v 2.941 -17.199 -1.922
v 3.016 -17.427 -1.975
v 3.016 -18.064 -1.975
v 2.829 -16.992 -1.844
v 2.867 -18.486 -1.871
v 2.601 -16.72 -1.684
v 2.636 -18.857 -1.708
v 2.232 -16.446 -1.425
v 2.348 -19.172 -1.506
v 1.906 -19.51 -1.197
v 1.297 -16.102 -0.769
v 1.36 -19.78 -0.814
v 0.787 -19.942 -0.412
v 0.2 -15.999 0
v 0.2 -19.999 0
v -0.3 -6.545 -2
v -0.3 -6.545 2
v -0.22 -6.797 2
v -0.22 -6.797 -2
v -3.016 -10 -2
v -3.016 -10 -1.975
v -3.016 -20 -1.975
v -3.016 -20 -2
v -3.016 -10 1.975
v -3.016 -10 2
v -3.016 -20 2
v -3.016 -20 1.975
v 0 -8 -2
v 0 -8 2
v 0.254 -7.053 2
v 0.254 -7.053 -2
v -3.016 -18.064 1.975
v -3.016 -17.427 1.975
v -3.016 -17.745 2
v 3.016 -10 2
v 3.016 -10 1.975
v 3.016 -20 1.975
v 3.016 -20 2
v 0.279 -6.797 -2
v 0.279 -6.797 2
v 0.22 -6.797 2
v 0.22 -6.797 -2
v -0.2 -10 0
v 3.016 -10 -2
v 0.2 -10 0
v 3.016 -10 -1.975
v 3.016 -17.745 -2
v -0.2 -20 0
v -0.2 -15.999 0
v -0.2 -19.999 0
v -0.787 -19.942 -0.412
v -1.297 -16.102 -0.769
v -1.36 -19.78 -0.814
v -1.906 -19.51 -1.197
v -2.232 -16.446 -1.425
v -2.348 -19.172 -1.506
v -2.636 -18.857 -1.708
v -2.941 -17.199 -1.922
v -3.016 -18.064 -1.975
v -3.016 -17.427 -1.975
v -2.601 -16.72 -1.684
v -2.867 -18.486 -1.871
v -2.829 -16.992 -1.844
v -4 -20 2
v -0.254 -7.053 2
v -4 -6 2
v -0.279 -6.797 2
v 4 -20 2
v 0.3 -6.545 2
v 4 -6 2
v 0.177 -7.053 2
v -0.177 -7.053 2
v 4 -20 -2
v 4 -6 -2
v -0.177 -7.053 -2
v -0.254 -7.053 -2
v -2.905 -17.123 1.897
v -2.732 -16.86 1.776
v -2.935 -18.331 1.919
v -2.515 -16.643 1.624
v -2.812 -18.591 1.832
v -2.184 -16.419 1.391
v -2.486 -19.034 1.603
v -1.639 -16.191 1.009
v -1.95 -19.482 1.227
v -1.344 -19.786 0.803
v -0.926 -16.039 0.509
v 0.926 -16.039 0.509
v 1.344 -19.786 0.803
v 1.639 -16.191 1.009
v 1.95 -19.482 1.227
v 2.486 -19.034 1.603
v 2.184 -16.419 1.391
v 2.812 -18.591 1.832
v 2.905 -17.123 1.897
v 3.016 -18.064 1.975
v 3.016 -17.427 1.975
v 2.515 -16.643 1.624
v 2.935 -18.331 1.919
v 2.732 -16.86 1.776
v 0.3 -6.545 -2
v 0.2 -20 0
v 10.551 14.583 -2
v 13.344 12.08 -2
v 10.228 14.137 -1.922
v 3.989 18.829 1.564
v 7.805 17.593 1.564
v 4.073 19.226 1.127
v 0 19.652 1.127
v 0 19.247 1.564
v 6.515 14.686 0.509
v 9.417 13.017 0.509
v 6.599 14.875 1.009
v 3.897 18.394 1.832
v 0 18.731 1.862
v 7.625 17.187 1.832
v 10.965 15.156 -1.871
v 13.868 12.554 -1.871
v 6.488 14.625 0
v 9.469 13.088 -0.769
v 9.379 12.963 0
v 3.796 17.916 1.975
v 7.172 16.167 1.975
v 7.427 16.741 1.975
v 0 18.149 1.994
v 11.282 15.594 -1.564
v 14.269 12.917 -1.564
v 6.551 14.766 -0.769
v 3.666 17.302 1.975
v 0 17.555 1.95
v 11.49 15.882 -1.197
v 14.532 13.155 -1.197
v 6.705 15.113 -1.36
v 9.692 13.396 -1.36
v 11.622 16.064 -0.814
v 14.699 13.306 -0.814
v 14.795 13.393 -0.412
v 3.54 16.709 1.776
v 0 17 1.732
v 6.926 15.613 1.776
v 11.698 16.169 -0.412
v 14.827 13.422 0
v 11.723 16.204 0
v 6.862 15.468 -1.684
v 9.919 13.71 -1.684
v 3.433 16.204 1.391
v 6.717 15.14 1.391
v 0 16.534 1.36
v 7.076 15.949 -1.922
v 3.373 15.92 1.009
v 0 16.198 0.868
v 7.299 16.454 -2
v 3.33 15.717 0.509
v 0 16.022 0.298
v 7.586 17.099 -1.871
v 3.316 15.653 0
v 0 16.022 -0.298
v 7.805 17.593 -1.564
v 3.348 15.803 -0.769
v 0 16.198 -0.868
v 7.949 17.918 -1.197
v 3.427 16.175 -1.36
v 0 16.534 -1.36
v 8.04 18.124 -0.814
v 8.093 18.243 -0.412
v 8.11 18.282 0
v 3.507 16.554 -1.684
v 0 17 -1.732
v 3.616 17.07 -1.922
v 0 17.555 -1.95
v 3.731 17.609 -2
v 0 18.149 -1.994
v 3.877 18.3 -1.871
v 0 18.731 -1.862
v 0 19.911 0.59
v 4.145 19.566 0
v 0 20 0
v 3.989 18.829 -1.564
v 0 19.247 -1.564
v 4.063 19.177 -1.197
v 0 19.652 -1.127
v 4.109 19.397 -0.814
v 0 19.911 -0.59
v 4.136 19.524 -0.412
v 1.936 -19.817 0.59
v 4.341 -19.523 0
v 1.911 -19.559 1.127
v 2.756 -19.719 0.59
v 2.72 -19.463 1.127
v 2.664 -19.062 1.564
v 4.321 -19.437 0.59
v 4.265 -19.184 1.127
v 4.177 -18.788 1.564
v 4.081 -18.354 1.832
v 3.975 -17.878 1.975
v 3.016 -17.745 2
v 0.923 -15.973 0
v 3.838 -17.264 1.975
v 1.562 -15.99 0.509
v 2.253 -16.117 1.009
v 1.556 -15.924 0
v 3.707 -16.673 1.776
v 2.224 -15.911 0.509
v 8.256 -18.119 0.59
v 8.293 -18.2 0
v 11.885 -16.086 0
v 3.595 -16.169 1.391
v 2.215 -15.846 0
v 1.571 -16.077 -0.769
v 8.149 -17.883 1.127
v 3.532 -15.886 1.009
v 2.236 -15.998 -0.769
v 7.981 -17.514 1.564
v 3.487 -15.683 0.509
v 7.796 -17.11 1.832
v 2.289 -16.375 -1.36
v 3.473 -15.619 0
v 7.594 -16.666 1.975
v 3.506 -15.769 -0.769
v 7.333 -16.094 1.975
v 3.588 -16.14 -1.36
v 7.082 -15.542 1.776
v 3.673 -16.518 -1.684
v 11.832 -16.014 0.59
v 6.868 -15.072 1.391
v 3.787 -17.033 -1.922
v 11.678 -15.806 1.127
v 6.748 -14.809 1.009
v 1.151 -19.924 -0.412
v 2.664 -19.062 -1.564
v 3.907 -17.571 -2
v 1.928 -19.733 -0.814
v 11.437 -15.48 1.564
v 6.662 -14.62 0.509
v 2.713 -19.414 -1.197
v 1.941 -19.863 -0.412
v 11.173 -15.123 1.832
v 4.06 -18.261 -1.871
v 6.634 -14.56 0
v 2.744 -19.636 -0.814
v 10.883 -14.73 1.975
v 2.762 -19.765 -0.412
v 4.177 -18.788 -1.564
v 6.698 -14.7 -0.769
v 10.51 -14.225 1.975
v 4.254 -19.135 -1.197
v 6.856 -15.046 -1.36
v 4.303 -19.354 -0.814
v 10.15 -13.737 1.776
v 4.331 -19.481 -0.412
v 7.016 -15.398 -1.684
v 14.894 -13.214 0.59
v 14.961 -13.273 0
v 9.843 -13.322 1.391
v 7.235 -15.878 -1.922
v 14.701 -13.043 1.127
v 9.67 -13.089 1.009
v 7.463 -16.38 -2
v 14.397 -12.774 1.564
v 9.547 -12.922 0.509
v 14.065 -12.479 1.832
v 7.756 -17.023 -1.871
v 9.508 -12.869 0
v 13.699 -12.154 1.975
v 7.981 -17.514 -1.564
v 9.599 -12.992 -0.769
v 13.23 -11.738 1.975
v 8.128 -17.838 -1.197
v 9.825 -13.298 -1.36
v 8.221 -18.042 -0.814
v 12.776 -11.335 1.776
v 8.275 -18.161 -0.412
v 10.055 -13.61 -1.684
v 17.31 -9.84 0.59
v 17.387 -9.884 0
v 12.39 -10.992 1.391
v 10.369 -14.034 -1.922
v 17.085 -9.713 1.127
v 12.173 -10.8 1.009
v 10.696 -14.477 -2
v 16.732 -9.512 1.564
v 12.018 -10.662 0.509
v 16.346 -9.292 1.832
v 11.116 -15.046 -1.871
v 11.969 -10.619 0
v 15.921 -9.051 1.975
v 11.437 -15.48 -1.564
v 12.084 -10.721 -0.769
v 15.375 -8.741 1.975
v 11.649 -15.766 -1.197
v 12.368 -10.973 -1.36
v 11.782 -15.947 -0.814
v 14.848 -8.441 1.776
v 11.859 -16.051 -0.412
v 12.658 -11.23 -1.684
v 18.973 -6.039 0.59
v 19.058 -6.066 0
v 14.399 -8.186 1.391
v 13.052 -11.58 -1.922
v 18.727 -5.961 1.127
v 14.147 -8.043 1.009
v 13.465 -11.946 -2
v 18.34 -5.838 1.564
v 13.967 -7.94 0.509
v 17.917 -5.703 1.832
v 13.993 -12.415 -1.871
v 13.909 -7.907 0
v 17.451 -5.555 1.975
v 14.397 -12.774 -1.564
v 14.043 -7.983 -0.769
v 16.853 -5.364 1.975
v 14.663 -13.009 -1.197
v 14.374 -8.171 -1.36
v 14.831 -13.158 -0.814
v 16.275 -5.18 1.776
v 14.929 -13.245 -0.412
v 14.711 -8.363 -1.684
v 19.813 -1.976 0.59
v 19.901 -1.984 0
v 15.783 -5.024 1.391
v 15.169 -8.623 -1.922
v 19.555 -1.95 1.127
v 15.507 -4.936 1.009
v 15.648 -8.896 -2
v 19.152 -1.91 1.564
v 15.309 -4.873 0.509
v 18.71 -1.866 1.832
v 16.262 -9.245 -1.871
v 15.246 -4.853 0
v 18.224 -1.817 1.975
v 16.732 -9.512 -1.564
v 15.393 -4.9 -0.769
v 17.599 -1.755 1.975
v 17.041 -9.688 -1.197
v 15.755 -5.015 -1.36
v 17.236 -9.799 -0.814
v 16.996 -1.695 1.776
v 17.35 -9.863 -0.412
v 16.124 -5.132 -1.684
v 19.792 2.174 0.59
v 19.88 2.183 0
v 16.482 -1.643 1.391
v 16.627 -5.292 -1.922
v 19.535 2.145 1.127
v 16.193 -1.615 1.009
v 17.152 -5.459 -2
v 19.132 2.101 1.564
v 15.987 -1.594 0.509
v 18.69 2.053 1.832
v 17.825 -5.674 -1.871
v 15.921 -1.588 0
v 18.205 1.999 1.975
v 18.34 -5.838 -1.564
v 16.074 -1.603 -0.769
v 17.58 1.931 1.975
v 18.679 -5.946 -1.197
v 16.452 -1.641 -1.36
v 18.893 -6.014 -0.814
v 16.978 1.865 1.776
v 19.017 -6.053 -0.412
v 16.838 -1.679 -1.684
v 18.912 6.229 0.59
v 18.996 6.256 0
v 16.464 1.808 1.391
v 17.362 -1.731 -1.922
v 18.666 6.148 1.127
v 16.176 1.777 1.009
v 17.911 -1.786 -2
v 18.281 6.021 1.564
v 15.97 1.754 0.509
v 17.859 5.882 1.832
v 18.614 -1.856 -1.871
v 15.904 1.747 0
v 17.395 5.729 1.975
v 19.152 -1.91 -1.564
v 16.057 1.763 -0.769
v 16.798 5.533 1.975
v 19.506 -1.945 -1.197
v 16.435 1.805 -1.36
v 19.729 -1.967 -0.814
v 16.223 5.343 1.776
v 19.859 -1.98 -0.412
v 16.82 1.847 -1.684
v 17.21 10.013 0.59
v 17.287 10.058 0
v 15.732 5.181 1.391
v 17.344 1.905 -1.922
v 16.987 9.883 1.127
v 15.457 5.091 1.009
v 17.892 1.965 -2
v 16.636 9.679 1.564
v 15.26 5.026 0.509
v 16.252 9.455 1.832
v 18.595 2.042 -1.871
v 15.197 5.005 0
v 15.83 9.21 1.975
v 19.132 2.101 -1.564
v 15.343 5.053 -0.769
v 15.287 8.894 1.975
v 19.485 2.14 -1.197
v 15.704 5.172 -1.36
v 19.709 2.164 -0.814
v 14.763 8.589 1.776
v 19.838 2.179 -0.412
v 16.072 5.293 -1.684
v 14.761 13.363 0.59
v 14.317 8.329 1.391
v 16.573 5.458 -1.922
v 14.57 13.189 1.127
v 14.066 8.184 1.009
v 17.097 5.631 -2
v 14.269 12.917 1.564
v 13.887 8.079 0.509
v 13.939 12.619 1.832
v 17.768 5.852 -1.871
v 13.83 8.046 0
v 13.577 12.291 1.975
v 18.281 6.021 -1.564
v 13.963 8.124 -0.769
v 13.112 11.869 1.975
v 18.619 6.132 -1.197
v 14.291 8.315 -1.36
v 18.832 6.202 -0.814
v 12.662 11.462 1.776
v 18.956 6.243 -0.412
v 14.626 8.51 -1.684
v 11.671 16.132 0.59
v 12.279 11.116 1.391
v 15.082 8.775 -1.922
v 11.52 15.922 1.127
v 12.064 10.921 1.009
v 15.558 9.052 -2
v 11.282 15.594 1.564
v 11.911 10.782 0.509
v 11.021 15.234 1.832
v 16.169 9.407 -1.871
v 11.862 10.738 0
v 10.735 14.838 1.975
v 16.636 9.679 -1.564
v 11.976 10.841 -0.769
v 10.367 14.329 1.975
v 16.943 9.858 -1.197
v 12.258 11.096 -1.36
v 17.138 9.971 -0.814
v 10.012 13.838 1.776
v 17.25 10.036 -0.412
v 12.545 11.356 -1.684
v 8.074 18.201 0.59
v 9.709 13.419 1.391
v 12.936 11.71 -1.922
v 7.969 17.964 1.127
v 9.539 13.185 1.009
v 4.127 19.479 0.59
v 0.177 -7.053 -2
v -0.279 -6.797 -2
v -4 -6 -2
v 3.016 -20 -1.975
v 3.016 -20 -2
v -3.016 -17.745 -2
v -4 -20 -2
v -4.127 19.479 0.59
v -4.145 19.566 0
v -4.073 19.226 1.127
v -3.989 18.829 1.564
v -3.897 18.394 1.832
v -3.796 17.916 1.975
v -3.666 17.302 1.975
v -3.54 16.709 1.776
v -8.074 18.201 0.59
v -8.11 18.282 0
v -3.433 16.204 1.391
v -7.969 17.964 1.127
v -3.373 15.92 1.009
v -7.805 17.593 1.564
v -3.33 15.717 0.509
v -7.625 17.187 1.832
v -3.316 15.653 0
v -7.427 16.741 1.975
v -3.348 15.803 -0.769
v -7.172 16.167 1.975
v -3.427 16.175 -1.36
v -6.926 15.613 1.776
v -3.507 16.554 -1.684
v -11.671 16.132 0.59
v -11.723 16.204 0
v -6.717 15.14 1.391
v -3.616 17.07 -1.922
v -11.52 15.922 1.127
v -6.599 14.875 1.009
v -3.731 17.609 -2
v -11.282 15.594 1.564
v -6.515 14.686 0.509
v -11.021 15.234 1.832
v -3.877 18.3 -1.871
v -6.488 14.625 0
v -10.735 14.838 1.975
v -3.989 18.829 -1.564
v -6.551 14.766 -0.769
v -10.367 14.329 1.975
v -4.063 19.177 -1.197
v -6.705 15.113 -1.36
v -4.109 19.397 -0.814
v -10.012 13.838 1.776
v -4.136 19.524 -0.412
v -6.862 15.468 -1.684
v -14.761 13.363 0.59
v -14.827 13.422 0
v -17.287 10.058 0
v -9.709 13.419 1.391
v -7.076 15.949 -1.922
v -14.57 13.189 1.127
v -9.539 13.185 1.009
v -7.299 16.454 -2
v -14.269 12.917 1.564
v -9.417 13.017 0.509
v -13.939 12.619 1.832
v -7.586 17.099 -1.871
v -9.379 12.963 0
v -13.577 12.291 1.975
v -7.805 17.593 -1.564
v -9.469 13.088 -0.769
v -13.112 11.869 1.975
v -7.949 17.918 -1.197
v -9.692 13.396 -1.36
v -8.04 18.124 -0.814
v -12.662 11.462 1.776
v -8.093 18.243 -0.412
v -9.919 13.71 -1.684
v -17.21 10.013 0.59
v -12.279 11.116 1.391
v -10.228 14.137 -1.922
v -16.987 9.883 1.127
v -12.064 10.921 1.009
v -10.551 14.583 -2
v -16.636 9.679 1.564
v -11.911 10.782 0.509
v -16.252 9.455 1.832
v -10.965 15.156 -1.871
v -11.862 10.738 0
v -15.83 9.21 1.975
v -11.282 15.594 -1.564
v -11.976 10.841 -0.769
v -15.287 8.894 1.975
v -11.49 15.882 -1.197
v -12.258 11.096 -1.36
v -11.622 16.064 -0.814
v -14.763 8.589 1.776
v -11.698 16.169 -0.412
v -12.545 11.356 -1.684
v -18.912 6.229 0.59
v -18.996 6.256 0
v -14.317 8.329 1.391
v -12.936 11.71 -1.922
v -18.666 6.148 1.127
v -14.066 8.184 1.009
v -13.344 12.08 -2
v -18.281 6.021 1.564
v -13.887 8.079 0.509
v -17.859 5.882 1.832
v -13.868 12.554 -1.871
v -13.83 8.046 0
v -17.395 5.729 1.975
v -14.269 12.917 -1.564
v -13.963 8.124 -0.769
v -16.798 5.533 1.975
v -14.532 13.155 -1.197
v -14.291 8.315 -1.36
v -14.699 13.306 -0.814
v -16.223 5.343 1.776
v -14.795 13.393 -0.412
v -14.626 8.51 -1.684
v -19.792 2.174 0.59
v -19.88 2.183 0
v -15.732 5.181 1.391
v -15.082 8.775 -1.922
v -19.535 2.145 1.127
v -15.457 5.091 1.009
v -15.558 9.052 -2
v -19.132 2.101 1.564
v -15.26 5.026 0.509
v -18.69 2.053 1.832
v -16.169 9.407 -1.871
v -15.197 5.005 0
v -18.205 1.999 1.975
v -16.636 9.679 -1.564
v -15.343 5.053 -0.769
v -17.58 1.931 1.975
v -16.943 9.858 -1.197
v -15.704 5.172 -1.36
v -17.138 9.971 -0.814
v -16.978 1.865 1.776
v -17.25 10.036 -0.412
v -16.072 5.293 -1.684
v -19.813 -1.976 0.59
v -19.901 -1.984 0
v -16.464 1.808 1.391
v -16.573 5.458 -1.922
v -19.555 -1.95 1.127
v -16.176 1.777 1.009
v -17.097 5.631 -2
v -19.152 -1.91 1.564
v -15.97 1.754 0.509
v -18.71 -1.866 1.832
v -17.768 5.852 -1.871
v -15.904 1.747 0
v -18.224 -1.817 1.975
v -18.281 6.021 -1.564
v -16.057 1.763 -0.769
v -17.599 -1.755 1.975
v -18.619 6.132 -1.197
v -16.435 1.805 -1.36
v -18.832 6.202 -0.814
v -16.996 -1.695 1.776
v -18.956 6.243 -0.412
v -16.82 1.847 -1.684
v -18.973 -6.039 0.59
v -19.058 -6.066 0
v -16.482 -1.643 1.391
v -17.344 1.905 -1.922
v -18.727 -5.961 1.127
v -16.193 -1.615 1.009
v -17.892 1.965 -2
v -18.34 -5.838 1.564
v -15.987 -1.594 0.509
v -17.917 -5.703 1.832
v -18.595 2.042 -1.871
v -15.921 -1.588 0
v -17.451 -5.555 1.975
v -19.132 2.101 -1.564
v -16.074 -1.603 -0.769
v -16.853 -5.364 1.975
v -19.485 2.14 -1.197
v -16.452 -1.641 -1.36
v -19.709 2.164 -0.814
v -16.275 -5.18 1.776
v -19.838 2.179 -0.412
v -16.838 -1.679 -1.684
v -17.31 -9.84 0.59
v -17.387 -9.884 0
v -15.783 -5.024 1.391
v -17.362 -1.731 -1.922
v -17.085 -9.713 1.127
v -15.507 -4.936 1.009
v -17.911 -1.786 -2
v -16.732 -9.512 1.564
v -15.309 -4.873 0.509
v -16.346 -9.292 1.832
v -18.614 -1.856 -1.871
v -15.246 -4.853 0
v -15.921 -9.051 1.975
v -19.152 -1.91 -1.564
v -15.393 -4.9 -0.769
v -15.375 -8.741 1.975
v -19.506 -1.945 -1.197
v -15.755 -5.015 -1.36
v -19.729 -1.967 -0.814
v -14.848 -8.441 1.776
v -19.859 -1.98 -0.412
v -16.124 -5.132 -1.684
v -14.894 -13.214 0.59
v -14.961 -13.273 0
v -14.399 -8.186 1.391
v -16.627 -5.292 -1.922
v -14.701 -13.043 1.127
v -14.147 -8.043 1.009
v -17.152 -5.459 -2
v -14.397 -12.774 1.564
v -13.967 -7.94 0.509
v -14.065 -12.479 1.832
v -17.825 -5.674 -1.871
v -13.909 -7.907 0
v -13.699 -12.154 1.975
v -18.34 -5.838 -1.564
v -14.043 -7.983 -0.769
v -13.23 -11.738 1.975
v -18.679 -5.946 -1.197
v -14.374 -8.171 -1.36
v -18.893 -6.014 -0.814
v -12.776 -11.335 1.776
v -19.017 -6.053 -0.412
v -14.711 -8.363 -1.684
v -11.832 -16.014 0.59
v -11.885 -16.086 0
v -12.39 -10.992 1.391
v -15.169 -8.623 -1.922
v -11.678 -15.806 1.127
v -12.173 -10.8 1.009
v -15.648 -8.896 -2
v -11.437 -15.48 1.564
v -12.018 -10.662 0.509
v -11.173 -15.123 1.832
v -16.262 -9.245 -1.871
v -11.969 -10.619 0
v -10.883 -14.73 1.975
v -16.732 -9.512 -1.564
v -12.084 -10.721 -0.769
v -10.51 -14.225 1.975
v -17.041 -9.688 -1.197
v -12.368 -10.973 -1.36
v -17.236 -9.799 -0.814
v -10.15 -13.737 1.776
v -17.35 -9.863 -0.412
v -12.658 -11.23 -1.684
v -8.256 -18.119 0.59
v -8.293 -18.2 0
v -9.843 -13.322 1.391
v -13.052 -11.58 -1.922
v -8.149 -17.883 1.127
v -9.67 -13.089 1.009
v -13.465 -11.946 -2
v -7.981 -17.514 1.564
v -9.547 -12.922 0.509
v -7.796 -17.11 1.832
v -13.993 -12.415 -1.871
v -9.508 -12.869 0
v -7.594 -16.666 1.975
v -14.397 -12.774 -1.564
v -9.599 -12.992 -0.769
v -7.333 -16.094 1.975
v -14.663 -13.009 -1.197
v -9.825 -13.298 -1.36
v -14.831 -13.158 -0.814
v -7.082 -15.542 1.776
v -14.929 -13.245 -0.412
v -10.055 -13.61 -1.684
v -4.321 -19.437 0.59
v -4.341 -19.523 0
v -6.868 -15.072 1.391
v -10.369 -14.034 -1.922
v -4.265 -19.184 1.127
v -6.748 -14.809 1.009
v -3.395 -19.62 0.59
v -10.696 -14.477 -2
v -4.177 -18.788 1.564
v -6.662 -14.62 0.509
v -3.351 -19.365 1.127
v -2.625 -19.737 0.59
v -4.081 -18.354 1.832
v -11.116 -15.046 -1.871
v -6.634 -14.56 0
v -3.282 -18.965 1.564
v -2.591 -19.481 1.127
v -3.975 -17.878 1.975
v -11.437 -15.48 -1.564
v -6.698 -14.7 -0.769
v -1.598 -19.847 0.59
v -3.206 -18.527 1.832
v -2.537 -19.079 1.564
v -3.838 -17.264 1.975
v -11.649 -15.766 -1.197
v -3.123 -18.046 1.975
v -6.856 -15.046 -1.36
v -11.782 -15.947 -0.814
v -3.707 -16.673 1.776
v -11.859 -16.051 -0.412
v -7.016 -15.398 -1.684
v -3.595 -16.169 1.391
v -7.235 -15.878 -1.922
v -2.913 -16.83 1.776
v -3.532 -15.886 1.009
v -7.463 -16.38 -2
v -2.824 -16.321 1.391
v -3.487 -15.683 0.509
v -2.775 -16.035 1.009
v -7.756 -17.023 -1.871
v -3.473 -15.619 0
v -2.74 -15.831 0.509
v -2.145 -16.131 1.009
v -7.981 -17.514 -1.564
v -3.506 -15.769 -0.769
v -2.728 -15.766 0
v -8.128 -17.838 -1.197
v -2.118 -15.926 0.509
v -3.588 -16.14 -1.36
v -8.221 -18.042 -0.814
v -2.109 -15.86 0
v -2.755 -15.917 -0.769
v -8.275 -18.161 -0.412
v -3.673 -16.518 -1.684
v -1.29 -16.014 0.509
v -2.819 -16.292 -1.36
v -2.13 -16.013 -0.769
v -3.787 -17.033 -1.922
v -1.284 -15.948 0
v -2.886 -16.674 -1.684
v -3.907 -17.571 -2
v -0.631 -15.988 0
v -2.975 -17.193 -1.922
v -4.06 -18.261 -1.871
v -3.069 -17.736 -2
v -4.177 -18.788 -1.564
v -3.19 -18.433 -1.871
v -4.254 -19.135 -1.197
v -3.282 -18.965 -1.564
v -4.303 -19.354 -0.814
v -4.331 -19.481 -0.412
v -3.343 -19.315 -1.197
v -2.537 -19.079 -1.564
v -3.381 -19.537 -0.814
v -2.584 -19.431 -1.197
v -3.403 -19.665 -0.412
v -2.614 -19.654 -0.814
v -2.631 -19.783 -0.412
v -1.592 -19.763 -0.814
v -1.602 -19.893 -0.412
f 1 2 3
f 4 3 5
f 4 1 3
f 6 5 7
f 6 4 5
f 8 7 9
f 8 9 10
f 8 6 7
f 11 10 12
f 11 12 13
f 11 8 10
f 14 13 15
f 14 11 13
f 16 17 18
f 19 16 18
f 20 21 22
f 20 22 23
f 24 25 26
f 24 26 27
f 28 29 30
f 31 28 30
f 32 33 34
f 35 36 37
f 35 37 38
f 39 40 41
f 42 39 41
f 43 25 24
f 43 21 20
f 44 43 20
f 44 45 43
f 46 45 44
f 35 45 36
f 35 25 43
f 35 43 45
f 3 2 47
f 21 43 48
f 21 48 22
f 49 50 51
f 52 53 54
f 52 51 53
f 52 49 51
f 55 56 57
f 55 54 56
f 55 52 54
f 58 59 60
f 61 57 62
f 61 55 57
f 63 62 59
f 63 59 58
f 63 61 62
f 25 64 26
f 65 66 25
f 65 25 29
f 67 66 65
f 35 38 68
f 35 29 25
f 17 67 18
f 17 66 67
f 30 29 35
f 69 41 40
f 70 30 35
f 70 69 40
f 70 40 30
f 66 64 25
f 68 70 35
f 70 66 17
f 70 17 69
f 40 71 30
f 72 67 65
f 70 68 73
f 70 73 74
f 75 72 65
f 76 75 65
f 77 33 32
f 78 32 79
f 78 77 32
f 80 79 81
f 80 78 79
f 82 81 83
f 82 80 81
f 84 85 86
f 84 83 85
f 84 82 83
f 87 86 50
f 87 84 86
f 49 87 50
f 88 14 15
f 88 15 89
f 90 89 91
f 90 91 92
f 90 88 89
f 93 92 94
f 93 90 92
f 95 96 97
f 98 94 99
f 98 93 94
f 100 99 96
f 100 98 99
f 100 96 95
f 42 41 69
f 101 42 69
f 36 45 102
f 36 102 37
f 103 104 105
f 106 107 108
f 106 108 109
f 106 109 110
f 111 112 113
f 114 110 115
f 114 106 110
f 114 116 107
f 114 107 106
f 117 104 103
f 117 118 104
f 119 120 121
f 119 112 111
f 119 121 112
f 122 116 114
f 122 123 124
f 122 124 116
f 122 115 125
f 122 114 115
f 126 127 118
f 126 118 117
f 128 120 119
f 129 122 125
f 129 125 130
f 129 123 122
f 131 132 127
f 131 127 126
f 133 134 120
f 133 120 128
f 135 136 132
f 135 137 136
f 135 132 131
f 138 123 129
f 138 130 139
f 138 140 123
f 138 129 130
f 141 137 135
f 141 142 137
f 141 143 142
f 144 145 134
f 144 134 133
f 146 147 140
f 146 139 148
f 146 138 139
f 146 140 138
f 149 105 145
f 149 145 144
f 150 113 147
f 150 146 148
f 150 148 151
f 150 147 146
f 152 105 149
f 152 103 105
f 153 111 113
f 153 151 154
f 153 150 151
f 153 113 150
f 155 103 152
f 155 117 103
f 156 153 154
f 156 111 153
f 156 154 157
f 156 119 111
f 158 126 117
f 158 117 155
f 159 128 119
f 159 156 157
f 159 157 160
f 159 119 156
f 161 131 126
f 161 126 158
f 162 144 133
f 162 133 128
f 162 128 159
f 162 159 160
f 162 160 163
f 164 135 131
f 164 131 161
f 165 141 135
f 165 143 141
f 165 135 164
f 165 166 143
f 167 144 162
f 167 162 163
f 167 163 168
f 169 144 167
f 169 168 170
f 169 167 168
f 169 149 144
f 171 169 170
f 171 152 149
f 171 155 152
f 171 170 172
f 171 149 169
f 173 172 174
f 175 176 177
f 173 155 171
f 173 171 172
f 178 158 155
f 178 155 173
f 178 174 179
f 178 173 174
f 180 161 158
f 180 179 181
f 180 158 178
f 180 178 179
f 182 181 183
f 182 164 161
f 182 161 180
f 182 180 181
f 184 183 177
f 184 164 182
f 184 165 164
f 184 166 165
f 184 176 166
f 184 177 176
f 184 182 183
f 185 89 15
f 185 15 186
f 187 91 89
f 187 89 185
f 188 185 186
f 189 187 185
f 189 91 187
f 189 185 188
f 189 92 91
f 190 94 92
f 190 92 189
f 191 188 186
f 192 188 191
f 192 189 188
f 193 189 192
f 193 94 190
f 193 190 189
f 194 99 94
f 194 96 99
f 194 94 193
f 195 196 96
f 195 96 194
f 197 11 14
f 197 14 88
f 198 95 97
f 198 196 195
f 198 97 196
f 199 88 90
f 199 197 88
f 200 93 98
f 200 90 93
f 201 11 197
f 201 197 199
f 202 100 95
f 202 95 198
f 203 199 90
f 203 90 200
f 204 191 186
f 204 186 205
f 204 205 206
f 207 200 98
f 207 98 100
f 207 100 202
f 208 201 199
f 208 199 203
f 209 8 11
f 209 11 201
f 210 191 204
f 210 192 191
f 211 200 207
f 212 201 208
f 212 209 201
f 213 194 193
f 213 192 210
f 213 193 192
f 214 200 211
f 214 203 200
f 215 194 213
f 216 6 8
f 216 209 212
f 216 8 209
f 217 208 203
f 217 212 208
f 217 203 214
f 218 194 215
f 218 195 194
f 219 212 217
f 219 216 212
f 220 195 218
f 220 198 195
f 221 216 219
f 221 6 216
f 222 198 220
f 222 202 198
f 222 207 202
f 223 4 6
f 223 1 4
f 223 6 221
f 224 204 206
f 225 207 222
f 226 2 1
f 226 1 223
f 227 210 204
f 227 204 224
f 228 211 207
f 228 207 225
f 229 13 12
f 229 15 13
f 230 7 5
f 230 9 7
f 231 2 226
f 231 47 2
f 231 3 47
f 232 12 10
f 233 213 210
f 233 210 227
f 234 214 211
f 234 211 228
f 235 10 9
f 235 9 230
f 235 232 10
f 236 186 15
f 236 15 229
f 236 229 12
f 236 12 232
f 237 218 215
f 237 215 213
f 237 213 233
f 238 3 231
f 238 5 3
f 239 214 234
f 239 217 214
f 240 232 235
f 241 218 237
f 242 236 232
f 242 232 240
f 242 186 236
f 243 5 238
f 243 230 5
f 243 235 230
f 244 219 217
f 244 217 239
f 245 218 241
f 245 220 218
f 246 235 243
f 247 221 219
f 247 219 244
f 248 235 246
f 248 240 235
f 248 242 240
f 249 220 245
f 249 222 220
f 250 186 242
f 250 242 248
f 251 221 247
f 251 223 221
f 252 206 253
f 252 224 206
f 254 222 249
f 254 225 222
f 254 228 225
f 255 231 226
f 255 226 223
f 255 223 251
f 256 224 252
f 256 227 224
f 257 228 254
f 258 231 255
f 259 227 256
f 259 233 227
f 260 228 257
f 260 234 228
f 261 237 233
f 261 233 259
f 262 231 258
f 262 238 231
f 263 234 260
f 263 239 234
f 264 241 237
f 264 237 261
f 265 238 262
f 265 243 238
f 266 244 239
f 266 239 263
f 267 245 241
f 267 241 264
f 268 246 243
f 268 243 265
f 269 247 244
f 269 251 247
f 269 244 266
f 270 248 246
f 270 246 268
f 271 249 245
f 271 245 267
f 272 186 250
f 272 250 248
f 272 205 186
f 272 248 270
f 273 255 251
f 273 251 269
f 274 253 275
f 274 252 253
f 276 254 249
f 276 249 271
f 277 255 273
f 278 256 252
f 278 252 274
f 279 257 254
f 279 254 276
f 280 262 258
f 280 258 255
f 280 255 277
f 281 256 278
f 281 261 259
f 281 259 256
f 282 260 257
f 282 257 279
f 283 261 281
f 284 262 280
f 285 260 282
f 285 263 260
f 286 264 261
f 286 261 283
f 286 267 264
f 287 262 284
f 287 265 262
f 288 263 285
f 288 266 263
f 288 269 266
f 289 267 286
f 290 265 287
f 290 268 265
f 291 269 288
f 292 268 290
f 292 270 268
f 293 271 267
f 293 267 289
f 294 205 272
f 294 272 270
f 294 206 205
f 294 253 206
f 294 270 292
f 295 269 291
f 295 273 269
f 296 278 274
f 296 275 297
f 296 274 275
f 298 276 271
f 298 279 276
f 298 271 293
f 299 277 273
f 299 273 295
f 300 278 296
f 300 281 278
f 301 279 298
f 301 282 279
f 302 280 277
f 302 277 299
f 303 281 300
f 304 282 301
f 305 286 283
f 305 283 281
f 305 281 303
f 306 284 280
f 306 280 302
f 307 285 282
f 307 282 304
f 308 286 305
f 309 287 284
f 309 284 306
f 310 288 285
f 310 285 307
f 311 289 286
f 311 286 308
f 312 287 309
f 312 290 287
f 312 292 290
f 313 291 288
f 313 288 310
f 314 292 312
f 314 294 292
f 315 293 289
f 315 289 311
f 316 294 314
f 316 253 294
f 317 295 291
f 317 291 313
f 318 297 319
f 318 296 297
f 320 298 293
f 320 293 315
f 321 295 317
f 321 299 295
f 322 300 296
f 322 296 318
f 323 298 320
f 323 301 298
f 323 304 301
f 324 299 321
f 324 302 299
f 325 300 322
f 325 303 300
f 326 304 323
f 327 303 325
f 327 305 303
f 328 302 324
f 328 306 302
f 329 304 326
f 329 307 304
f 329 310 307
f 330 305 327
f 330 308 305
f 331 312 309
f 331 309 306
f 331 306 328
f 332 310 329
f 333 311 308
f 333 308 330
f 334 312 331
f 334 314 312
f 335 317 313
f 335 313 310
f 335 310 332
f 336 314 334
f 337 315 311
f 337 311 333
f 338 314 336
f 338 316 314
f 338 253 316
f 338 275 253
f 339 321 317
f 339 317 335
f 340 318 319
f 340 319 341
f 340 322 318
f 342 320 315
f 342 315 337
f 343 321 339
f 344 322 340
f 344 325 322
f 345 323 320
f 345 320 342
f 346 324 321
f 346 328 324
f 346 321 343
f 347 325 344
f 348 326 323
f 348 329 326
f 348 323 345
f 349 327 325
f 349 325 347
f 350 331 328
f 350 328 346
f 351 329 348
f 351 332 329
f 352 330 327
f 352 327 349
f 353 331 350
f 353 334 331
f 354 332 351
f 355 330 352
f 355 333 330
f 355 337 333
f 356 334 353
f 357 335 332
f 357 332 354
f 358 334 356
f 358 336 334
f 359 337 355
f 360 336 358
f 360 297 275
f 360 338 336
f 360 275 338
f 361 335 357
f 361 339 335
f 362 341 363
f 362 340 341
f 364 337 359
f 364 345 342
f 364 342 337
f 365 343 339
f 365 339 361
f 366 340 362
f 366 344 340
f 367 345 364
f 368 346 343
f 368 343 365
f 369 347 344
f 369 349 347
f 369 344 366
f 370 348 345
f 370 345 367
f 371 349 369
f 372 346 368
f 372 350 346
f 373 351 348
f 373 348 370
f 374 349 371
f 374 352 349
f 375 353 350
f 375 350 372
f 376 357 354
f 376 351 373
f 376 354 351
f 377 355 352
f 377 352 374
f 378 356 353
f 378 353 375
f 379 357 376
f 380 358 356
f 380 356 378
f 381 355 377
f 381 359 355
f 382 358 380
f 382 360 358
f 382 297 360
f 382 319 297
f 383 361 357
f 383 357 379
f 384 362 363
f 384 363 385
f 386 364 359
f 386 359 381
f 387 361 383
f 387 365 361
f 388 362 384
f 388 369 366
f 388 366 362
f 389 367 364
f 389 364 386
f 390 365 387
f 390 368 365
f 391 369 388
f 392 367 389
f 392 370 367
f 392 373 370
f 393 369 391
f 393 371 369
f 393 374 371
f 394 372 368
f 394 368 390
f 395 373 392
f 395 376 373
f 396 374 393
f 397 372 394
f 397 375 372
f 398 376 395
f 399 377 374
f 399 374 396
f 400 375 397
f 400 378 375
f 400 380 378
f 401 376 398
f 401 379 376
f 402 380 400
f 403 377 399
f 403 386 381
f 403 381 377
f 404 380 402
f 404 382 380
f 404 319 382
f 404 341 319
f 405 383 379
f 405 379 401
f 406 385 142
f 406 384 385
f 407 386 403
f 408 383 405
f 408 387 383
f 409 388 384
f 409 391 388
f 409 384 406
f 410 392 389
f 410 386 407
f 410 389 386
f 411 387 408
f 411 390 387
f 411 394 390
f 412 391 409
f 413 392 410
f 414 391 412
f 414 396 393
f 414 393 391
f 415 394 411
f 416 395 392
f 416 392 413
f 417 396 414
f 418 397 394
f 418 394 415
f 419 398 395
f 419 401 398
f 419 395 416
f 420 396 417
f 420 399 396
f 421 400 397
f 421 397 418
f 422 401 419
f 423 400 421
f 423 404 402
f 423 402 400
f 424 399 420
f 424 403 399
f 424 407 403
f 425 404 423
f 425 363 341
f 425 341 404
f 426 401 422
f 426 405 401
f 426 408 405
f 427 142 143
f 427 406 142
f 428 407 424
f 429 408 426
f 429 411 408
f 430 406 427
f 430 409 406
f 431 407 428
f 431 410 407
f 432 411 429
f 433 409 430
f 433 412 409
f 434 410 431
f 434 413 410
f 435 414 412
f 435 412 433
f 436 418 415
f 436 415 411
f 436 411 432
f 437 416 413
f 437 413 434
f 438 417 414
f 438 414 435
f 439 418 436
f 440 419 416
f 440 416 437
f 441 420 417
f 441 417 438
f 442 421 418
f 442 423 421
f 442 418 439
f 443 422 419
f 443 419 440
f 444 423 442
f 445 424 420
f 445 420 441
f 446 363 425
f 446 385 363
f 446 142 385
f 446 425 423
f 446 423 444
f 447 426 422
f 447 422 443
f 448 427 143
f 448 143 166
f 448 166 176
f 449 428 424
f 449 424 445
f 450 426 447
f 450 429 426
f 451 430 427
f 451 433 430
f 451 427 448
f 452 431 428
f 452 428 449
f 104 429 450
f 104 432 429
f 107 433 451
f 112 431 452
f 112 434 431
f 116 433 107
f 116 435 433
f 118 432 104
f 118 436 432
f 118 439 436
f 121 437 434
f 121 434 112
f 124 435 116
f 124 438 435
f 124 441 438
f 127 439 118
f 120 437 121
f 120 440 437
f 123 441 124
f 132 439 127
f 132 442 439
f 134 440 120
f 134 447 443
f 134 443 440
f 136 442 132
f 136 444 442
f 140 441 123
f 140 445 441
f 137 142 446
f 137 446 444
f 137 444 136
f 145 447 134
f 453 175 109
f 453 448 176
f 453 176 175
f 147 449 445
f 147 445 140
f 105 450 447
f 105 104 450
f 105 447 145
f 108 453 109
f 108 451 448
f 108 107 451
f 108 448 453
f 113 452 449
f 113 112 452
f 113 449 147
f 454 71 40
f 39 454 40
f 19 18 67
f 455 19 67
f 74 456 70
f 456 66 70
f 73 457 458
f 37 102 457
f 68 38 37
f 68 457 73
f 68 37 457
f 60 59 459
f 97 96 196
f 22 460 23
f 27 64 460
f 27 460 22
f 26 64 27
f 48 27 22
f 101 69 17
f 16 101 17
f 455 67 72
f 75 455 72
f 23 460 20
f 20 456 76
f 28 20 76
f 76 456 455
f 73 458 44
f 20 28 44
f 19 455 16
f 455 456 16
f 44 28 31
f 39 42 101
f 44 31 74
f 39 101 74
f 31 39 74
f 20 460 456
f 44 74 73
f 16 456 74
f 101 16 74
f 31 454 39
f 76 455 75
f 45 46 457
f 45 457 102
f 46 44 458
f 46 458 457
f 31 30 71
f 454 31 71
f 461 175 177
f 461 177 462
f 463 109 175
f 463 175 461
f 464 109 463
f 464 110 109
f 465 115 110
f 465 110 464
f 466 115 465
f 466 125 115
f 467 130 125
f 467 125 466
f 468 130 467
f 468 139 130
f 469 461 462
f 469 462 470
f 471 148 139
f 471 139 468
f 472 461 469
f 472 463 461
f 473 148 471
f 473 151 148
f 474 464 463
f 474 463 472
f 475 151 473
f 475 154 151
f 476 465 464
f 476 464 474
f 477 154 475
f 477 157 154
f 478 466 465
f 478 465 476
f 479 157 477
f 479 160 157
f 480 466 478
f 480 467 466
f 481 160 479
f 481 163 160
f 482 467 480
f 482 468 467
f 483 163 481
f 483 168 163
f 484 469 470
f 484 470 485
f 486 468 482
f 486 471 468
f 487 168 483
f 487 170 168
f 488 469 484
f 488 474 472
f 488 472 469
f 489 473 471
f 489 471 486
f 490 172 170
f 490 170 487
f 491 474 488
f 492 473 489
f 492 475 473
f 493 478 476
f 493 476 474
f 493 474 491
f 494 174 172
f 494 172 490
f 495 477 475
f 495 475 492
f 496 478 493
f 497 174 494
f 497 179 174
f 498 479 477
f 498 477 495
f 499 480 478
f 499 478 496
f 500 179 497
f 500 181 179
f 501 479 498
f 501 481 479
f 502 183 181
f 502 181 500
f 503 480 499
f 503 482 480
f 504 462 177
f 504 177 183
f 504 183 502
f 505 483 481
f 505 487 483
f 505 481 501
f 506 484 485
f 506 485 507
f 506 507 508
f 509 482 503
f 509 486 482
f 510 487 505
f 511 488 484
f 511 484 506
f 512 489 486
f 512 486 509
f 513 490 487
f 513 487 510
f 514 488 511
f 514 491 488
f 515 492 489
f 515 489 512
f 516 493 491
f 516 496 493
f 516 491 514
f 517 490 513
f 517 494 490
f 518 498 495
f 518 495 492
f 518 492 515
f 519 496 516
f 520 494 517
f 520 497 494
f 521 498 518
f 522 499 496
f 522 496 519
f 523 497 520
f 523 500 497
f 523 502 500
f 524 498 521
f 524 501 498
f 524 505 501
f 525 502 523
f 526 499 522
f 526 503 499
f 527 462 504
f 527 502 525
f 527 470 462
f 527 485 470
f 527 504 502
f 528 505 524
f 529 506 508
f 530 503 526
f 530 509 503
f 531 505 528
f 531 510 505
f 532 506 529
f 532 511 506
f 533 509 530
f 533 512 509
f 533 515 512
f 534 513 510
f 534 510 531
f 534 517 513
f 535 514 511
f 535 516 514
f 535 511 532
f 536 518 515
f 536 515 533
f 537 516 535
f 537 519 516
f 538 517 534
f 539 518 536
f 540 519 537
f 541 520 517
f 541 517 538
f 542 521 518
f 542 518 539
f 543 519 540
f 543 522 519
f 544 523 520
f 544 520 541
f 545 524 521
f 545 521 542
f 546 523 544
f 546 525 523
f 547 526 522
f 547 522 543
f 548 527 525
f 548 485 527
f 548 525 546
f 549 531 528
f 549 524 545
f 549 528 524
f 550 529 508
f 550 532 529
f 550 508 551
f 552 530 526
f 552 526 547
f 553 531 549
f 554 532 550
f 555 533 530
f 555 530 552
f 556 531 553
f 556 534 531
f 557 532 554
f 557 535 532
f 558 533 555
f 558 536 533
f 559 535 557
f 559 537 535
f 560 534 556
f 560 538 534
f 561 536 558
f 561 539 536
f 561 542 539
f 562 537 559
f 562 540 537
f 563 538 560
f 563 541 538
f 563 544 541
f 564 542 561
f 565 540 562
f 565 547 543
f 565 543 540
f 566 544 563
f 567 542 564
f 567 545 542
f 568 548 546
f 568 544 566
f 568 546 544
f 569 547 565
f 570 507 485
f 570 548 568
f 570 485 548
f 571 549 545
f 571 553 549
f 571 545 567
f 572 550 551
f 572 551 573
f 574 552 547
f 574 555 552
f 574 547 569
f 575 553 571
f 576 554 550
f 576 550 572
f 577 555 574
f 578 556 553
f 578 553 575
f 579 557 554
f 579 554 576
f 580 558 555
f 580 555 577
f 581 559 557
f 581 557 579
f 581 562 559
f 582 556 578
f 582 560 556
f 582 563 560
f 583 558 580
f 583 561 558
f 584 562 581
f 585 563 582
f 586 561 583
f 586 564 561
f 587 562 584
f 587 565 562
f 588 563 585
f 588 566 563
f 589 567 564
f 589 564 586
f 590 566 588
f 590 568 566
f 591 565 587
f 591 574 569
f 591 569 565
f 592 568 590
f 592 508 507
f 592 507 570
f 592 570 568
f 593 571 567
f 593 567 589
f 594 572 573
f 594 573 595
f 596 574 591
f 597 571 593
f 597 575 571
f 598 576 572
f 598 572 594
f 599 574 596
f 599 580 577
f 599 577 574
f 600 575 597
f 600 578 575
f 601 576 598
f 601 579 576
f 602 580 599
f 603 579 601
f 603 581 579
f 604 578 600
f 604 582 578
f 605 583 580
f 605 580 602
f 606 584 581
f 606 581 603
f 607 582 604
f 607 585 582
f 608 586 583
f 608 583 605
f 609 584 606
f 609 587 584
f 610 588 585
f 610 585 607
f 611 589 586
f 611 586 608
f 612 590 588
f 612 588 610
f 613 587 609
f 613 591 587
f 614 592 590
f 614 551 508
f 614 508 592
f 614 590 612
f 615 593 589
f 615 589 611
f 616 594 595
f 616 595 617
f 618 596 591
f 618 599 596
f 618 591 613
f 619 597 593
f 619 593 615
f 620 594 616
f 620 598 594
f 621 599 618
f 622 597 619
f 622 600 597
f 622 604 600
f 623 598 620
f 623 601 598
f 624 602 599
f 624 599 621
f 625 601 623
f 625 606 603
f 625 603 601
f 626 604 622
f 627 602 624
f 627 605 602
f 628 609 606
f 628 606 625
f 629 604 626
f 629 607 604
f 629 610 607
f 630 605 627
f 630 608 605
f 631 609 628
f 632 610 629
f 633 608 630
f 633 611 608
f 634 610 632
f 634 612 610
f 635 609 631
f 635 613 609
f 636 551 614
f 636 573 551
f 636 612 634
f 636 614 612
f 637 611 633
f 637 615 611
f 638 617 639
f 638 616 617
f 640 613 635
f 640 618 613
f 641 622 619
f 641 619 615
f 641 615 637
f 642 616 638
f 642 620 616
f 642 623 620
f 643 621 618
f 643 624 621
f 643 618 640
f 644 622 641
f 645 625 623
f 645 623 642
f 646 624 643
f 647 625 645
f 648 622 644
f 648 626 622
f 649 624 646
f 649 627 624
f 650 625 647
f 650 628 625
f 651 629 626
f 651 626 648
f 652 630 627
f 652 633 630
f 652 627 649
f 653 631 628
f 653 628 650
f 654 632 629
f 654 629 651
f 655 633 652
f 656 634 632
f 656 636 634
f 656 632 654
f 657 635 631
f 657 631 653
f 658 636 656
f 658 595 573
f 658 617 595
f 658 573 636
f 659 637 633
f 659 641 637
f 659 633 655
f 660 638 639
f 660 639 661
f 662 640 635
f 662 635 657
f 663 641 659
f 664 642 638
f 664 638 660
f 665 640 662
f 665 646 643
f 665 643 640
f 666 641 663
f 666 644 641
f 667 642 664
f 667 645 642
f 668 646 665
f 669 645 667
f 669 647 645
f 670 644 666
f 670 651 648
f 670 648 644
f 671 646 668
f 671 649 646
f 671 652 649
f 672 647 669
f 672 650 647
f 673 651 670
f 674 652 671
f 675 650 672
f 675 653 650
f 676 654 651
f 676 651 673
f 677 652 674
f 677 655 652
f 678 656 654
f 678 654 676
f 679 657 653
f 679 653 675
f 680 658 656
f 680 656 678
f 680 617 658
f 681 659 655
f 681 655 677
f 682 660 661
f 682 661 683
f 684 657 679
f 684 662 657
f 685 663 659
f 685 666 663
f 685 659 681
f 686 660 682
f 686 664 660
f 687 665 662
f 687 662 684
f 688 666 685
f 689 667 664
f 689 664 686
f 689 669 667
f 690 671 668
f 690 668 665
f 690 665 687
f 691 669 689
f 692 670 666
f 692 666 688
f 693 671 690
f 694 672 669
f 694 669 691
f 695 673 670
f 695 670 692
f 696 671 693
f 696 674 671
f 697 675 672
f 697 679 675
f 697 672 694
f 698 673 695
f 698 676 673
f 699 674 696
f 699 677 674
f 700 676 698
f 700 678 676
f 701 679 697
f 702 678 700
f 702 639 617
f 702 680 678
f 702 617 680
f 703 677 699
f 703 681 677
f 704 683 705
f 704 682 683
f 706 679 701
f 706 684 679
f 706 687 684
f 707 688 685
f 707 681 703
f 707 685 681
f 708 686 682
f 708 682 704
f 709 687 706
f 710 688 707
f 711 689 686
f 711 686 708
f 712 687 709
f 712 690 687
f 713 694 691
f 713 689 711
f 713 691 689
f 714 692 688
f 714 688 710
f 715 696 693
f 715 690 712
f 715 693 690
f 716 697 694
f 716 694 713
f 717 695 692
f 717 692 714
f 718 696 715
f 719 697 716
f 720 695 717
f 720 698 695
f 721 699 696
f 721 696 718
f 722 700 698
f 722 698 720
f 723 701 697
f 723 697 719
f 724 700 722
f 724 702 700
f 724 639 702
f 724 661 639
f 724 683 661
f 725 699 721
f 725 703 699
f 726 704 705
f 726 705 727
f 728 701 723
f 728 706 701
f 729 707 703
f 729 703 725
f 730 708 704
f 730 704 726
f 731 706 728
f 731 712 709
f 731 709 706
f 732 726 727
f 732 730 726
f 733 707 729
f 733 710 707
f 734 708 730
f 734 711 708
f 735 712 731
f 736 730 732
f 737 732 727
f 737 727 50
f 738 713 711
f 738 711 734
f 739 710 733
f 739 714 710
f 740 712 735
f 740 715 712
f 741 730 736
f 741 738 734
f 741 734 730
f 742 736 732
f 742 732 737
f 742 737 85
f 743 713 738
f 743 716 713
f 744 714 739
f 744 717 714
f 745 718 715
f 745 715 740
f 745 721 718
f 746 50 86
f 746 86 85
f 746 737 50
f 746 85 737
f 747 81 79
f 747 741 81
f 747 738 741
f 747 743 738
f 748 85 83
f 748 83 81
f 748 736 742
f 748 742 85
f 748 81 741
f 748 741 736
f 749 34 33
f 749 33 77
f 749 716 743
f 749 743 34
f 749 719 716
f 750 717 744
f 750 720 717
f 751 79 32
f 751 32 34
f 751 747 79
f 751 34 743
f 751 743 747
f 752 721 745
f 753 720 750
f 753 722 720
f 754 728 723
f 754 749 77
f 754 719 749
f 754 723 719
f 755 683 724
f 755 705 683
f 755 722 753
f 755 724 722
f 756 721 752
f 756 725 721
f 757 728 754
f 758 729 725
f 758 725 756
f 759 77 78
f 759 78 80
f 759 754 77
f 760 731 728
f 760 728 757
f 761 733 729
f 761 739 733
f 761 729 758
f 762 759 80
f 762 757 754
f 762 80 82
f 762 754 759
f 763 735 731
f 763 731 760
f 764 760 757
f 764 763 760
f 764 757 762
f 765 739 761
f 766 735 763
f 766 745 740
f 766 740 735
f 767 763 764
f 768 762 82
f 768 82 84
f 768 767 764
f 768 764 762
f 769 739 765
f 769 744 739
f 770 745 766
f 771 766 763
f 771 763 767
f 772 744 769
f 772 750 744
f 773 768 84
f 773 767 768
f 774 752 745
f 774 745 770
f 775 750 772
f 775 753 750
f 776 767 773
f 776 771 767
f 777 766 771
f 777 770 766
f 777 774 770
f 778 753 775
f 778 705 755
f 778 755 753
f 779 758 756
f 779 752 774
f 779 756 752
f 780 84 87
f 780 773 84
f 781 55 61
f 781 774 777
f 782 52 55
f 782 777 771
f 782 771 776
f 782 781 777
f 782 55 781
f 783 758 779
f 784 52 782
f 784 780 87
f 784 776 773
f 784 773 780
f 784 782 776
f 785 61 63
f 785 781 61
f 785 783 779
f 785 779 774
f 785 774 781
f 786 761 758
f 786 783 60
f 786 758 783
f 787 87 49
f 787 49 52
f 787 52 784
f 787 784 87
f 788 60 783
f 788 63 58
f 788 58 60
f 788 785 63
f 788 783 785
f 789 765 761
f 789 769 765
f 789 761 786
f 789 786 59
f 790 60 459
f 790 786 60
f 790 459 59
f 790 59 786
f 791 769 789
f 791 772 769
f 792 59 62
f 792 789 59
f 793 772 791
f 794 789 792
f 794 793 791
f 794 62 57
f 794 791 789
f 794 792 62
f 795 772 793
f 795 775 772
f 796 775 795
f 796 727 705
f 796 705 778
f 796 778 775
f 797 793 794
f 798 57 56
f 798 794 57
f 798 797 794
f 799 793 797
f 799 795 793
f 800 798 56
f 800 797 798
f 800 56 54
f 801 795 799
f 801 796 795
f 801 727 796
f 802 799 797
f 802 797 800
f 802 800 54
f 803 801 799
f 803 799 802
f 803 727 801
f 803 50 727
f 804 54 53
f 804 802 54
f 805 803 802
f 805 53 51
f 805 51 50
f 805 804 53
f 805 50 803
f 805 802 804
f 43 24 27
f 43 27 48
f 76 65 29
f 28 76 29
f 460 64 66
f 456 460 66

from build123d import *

# Parameters (mm, degrees)
F1_R          = 2
F3_W          = 8
F3_H          = 14
F4_DEPTH      = 2
F4_DEPTH_BACK = 2
F6_START      = 10
F6_DEPTH      = 16
F8_DEPTH      = 25


with BuildPart() as f2:
    # F1 (on Right) → F2 (revolve)
    with BuildSketch(Plane.YZ):
        with Locations((18, 0)):
            Circle(F1_R)
    revolve(axis=Axis((0, 0, 0), (0, 0, 1)))


with BuildPart() as f4:
    # F3 (on Top) → F4 (new body, two sides)
    with BuildSketch(Plane.XY) as f4_sk:
        with Locations((0, -13)):
            Rectangle(F3_W, F3_H)
    extrude(amount=F4_DEPTH)
    extrude(f4_sk.sketch, amount=-F4_DEPTH_BACK)


with BuildPart() as f6_tool:
    # F5 (on Front) → F6 (new body)
    with BuildSketch(Plane.XZ.offset(F6_START)):
        Polygon((-0.2, 0), (0, 0), (0.2, 0), (3.0159020573, 1.9751908258), (3.0159020573, 2.0010224544), (-3.0159020573, 2.0010224544), (-3.0159020573, 1.9751908258), align=None)
        Polygon((0.2, 0), (0, 0), (-0.2, 0), (-3.0159020573, -1.9751908258), (-3.0159020573, -2.0010224544), (3.0159020573, -2.0010224544), (3.0159020573, -1.9751908258), align=None)
    extrude(amount=F6_DEPTH)


with BuildPart() as f2_1:
    add(f2.part)

    # F6: cut by f6_tool
    add(f6_tool.part, mode=Mode.SUBTRACT)


with BuildPart() as f4_1:
    add(f4.part)

    # F6: cut by f6_tool
    add(f6_tool.part, mode=Mode.SUBTRACT)

    # F7 (on face) → F8 (cut)
    with BuildSketch(Plane.XY.offset(2)):
        Polygon((0.3, -6.5454615004), (0, -6.5454615004), (0, -8), (0.254194194, -7.0529617369), (0.1772082032, -7.0529617369), (0.2791219449, -6.7974678241), (0.2203497424, -6.7974678241), align=None)
        Polygon((0, -8), (0, -6.5454615004), (-0.3, -6.5454615004), (-0.2203497424, -6.7974678241), (-0.2791219449, -6.7974678241), (-0.1772082032, -7.0529617369), (-0.254194194, -7.0529617369), align=None)
    extrude(amount=-F8_DEPTH, mode=Mode.SUBTRACT)


solid = Compound([f2_1.part, f4_1.part])
